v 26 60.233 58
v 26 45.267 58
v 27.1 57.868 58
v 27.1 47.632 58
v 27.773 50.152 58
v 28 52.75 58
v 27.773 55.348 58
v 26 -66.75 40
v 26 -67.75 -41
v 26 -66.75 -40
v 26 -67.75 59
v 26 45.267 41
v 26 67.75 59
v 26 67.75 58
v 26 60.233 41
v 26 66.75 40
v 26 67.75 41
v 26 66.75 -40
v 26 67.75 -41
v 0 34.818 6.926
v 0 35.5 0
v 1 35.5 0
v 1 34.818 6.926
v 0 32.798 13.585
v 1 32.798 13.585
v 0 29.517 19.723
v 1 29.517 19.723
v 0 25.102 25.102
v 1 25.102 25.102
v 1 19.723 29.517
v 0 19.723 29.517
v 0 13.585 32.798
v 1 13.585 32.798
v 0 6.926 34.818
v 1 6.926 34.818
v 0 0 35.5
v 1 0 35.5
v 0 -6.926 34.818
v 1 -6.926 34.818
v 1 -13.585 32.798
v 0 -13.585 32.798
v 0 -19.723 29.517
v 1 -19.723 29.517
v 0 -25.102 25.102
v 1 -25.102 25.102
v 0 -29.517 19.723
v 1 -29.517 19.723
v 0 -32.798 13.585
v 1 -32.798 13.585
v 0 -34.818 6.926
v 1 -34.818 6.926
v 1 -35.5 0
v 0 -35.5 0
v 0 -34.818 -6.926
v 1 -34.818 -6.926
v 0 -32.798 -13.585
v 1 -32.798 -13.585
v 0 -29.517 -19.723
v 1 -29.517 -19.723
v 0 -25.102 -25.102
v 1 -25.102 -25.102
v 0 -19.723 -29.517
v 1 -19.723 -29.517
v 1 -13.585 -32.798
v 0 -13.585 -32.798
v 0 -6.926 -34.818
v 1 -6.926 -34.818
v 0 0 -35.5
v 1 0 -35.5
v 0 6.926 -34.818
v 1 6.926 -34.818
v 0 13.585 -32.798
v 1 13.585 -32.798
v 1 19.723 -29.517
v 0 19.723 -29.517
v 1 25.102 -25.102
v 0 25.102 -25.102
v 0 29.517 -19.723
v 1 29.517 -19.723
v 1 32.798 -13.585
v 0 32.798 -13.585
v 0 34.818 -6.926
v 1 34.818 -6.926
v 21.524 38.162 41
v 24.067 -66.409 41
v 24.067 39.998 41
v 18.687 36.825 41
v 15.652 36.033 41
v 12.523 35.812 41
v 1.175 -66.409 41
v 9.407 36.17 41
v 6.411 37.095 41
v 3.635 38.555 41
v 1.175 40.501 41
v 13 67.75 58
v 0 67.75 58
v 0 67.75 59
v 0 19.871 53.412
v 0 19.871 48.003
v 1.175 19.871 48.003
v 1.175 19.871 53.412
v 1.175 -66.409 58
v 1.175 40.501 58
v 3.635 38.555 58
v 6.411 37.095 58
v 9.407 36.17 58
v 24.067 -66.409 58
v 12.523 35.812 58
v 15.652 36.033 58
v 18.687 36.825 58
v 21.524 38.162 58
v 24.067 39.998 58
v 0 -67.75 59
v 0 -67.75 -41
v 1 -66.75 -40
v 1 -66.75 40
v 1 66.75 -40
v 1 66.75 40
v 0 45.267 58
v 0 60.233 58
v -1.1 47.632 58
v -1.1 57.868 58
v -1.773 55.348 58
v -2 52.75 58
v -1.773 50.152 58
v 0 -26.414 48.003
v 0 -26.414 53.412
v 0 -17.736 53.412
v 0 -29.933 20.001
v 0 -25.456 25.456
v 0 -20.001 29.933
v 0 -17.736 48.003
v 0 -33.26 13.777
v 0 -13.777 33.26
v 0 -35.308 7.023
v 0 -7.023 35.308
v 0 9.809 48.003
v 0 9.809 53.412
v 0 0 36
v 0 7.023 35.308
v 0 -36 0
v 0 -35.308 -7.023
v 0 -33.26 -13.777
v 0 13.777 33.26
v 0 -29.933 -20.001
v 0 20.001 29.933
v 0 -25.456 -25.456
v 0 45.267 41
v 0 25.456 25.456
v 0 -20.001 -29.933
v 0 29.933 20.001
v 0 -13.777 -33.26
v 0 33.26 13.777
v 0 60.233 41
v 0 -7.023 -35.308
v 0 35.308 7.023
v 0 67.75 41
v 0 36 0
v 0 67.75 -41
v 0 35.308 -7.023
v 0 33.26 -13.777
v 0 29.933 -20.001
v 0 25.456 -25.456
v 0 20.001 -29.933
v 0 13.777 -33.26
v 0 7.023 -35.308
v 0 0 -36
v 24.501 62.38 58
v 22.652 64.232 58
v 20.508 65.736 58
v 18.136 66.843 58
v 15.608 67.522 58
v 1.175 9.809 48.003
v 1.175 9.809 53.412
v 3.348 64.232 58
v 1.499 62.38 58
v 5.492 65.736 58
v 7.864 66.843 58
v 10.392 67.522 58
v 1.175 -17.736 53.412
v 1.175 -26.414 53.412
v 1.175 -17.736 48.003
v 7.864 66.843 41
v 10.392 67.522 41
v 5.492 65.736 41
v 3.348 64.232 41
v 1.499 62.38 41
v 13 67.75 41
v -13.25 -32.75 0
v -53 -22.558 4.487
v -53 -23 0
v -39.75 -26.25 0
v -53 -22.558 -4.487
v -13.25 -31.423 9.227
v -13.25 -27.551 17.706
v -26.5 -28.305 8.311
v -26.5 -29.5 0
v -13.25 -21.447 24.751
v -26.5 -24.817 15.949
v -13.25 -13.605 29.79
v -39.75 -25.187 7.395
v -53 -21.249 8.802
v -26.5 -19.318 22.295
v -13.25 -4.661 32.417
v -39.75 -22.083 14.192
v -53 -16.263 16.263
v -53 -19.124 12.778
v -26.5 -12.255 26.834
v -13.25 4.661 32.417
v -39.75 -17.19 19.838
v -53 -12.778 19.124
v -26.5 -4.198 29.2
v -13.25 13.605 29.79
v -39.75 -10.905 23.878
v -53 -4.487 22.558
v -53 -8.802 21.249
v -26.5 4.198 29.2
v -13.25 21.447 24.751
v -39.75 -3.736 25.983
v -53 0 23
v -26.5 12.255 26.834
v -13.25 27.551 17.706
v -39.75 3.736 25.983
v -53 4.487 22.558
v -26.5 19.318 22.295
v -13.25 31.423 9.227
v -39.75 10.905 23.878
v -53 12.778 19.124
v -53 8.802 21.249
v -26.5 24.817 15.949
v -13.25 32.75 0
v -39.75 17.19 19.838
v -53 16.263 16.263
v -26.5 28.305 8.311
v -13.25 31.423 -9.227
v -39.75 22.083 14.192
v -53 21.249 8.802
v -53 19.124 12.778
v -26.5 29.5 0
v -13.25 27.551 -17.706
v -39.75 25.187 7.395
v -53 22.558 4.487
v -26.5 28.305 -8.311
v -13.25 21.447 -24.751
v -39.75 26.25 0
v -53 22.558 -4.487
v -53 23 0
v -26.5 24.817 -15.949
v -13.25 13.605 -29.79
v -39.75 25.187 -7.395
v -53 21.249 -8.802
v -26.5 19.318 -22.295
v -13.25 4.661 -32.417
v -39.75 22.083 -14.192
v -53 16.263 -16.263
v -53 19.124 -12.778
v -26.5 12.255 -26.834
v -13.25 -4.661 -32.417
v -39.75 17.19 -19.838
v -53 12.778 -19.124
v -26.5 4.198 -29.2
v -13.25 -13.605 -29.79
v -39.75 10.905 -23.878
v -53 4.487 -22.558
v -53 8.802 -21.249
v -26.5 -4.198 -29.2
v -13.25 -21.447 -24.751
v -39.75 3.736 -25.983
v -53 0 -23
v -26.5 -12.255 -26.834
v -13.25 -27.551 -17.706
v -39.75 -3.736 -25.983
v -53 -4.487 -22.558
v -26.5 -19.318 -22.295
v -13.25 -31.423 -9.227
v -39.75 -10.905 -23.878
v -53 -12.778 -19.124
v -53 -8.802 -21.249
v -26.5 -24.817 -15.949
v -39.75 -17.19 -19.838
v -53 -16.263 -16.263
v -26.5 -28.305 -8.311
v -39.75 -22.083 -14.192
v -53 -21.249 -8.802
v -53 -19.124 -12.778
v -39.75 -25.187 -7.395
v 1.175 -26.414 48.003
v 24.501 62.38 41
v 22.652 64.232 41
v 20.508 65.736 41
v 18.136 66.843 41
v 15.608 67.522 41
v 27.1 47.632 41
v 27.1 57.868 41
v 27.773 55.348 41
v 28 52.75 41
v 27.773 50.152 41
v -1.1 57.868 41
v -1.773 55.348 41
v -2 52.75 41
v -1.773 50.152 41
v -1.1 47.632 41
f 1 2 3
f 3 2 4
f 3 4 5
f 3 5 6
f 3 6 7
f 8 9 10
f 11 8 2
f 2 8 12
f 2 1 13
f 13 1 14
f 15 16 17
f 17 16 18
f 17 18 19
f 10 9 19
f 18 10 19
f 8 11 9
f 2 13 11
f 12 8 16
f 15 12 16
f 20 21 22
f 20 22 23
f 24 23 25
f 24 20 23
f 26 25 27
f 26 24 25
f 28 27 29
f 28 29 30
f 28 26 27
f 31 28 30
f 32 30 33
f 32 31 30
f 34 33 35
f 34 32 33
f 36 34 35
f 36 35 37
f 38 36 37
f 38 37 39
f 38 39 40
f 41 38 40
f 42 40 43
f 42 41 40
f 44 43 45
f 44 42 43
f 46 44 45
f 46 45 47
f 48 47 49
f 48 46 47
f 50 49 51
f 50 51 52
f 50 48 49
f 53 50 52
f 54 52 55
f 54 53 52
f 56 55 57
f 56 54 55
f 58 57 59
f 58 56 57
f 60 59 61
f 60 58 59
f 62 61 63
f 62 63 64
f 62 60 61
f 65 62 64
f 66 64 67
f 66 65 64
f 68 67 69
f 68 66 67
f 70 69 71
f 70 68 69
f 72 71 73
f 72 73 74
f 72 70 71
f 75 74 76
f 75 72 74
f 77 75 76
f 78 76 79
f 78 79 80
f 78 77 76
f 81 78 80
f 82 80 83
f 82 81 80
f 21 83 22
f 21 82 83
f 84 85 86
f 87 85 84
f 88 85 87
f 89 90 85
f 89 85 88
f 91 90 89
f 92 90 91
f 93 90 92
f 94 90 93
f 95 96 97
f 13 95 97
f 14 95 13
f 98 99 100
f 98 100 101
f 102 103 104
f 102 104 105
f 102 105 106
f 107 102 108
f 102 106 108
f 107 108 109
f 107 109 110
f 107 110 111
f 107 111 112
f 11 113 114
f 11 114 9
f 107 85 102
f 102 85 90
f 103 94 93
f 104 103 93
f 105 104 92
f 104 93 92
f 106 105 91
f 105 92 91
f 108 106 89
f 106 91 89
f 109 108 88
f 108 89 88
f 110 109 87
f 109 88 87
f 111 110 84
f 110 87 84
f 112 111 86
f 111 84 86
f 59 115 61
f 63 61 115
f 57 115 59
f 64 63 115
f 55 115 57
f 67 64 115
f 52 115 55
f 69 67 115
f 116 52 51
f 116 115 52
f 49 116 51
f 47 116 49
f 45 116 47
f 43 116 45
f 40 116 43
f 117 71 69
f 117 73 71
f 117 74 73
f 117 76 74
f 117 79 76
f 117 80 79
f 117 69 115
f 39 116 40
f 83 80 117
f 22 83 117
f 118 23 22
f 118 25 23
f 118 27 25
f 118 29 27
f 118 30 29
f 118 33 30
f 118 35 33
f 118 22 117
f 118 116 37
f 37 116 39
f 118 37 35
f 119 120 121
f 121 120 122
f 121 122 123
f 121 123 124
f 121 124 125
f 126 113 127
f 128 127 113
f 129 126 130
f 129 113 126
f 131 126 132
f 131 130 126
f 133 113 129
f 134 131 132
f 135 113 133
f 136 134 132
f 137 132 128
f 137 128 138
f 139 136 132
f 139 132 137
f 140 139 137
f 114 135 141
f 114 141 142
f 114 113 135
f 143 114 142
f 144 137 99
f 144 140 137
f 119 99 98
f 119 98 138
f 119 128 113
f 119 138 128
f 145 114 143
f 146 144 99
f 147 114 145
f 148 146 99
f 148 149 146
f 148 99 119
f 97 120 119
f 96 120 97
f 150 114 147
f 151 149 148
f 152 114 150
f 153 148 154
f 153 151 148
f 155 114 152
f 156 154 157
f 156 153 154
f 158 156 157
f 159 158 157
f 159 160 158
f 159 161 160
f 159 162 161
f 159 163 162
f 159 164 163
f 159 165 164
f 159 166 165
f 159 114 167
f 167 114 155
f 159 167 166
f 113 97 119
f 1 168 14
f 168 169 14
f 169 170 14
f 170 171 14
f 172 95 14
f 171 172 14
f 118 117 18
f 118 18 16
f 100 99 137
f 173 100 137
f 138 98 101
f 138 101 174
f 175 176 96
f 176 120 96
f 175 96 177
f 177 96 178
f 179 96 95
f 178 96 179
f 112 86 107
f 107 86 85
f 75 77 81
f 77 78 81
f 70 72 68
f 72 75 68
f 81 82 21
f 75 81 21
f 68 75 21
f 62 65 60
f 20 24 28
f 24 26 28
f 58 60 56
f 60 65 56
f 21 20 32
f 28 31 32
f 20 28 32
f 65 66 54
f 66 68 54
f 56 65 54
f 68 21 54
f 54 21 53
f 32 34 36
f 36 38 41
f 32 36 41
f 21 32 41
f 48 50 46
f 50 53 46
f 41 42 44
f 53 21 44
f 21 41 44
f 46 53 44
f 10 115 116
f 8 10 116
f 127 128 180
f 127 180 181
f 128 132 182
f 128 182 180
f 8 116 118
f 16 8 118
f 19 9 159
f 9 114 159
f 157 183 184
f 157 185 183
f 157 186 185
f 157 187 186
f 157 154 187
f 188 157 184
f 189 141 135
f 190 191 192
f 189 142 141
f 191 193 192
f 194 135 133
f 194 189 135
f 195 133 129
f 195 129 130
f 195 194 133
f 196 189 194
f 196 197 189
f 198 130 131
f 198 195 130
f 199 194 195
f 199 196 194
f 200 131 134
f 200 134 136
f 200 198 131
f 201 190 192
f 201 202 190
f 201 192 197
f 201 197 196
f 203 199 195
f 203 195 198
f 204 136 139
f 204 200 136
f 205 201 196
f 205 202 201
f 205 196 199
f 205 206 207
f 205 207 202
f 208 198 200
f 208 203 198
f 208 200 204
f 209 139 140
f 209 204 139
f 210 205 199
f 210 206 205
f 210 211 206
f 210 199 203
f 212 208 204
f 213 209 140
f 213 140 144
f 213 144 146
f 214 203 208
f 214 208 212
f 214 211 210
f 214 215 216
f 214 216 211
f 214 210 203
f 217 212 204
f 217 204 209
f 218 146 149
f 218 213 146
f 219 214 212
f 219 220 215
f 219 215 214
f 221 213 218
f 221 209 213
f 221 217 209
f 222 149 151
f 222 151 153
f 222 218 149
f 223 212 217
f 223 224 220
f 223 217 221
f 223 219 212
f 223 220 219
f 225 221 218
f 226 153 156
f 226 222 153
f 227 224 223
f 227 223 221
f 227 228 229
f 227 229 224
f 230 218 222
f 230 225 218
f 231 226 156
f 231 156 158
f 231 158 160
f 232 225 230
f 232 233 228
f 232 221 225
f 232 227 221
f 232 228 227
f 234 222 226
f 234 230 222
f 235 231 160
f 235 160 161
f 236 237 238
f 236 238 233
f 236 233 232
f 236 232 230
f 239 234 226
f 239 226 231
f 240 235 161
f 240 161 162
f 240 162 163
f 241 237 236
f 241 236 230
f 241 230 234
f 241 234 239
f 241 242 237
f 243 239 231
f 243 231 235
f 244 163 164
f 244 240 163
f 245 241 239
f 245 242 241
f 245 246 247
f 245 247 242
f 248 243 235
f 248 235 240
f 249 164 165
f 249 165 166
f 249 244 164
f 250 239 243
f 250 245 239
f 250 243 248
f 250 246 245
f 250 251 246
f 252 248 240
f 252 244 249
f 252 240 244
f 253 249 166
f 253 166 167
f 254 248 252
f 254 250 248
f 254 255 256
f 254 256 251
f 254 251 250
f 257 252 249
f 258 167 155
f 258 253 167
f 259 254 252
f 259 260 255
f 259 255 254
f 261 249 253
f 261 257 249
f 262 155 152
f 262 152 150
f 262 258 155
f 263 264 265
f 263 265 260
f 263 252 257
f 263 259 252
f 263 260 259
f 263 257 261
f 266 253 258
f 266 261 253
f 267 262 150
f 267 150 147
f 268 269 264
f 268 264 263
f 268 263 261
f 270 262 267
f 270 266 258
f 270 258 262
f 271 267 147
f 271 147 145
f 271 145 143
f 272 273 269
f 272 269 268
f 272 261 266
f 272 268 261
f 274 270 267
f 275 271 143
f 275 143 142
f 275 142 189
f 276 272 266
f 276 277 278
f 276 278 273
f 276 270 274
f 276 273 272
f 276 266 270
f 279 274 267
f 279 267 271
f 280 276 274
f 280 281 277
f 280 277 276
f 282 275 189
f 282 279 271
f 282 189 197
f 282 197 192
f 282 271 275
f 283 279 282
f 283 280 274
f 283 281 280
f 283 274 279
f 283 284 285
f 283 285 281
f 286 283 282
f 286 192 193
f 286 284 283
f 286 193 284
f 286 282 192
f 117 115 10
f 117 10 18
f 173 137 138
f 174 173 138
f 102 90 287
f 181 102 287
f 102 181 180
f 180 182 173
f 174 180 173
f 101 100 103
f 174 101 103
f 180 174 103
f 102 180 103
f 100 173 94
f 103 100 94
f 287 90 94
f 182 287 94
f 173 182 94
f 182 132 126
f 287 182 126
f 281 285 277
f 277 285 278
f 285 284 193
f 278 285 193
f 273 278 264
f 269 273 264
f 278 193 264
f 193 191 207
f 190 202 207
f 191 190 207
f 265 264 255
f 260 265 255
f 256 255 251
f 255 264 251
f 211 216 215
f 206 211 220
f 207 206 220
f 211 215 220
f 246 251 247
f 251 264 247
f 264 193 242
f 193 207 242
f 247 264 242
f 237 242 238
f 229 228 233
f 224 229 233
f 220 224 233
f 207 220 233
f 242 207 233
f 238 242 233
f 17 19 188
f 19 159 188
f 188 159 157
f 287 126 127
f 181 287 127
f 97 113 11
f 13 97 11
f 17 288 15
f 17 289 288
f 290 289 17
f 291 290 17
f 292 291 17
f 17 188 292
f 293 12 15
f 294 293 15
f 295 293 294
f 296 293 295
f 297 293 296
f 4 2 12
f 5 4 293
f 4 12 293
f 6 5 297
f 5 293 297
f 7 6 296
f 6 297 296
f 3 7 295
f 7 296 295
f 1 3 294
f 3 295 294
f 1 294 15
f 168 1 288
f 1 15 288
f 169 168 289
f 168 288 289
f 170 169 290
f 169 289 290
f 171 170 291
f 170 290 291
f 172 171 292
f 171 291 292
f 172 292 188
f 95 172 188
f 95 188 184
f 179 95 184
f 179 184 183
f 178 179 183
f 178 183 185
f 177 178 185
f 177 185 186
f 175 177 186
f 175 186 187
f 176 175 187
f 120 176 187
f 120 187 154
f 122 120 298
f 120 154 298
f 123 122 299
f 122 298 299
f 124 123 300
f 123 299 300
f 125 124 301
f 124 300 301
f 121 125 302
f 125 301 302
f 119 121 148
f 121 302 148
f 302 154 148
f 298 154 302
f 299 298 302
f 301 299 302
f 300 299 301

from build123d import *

# Parameters (mm, degrees)
F0_W      = 135.5
F0_H      = 82
F0_R      = 35.5
F1_DEPTH  = 1
F2_R      = 36
F4_R      = 23
F6_W      = 135.5
F6_H      = 82
F6_W_2    = 133.5
F6_H_2    = 80
F7_DEPTH  = 25
F8_R      = 15
F9_DEPTH  = 17
F11_DEPTH = 17
F12_W     = 26
F12_H     = 135.5
F13_DEPTH = 1
F14_W     = 8.678573
F14_H     = 5.408388
F14_W_2   = 10.062111
F15_DEPTH = 17.4


with BuildPart() as f1:
    # F0 (on Right) → F1 (new body)
    with BuildSketch(Plane.YZ):
        Rectangle(F0_W, F0_H)
        Circle(F0_R, mode=Mode.SUBTRACT)
    extrude(amount=F1_DEPTH)

    # F2 (on face) → F5 section 0
    with BuildSketch(Plane(origin=(0, 0, 0), x_dir=(0, -1, 0), z_dir=(-1, 0, 0))):
        Circle(F2_R)
    # F4 (on offset) → F5 section 1
    with BuildSketch(Plane.YZ.offset(-53)):
        Circle(F4_R)
    loft()

    # F6 (on face) → F7 (join)
    with BuildSketch(Plane.YZ.offset(1)):
        Rectangle(F6_W, F6_H)
        Rectangle(F6_W_2, F6_H_2, mode=Mode.SUBTRACT)
    extrude(amount=F7_DEPTH)

    # F8 (on face) → F9 (join)
    with BuildSketch(Plane.XY.offset(41)):
        with Locations((13, 52.75)):
            Circle(F8_R)
    extrude(amount=F9_DEPTH)

    # F10 (on face) → F11 (join)
    with BuildSketch(Plane.XY.offset(41)):
        with BuildLine():
            Line((0, -67.75), (26, -67.75))
            Line((26, -67.75), (26, 45.266685))
            ThreePointArc((26, 45.266685), (13, 37.770541), (0, 45.266685))
            Line((0, 45.266685), (0, -67.75))
        make_face()
        with BuildLine():
            Line((24.066526, -66.408634), (1.175221, -66.408634))
            Line((1.175221, -66.408634), (1.175221, 40.501304))
            ThreePointArc((1.175221, 40.501304), (12.523338, 35.811878), (24.066526, 39.9982))
            Line((24.066526, 39.9982), (24.066526, -66.408634))
        make_face(mode=Mode.SUBTRACT)
    extrude(amount=F11_DEPTH)

    # F12 (on face) → F13 (join)
    with BuildSketch(Plane.XY.offset(58)):
        with Locations((13, 0)):
            Rectangle(F12_W, F12_H)
    extrude(amount=F13_DEPTH)

    # F14 (on face) → F15 (cut)
    with BuildSketch(Plane(origin=(0, 0, 0), x_dir=(0, -1, 0), z_dir=(-1, 0, 0))):
        with Locations((22.075063, 50.707543)):
            Rectangle(F14_W, F14_H)
        with Locations((-14.84031, 50.707543)):
            Rectangle(F14_W_2, F14_H)
    extrude(amount=-F15_DEPTH, mode=Mode.SUBTRACT)


solid = f1.part
